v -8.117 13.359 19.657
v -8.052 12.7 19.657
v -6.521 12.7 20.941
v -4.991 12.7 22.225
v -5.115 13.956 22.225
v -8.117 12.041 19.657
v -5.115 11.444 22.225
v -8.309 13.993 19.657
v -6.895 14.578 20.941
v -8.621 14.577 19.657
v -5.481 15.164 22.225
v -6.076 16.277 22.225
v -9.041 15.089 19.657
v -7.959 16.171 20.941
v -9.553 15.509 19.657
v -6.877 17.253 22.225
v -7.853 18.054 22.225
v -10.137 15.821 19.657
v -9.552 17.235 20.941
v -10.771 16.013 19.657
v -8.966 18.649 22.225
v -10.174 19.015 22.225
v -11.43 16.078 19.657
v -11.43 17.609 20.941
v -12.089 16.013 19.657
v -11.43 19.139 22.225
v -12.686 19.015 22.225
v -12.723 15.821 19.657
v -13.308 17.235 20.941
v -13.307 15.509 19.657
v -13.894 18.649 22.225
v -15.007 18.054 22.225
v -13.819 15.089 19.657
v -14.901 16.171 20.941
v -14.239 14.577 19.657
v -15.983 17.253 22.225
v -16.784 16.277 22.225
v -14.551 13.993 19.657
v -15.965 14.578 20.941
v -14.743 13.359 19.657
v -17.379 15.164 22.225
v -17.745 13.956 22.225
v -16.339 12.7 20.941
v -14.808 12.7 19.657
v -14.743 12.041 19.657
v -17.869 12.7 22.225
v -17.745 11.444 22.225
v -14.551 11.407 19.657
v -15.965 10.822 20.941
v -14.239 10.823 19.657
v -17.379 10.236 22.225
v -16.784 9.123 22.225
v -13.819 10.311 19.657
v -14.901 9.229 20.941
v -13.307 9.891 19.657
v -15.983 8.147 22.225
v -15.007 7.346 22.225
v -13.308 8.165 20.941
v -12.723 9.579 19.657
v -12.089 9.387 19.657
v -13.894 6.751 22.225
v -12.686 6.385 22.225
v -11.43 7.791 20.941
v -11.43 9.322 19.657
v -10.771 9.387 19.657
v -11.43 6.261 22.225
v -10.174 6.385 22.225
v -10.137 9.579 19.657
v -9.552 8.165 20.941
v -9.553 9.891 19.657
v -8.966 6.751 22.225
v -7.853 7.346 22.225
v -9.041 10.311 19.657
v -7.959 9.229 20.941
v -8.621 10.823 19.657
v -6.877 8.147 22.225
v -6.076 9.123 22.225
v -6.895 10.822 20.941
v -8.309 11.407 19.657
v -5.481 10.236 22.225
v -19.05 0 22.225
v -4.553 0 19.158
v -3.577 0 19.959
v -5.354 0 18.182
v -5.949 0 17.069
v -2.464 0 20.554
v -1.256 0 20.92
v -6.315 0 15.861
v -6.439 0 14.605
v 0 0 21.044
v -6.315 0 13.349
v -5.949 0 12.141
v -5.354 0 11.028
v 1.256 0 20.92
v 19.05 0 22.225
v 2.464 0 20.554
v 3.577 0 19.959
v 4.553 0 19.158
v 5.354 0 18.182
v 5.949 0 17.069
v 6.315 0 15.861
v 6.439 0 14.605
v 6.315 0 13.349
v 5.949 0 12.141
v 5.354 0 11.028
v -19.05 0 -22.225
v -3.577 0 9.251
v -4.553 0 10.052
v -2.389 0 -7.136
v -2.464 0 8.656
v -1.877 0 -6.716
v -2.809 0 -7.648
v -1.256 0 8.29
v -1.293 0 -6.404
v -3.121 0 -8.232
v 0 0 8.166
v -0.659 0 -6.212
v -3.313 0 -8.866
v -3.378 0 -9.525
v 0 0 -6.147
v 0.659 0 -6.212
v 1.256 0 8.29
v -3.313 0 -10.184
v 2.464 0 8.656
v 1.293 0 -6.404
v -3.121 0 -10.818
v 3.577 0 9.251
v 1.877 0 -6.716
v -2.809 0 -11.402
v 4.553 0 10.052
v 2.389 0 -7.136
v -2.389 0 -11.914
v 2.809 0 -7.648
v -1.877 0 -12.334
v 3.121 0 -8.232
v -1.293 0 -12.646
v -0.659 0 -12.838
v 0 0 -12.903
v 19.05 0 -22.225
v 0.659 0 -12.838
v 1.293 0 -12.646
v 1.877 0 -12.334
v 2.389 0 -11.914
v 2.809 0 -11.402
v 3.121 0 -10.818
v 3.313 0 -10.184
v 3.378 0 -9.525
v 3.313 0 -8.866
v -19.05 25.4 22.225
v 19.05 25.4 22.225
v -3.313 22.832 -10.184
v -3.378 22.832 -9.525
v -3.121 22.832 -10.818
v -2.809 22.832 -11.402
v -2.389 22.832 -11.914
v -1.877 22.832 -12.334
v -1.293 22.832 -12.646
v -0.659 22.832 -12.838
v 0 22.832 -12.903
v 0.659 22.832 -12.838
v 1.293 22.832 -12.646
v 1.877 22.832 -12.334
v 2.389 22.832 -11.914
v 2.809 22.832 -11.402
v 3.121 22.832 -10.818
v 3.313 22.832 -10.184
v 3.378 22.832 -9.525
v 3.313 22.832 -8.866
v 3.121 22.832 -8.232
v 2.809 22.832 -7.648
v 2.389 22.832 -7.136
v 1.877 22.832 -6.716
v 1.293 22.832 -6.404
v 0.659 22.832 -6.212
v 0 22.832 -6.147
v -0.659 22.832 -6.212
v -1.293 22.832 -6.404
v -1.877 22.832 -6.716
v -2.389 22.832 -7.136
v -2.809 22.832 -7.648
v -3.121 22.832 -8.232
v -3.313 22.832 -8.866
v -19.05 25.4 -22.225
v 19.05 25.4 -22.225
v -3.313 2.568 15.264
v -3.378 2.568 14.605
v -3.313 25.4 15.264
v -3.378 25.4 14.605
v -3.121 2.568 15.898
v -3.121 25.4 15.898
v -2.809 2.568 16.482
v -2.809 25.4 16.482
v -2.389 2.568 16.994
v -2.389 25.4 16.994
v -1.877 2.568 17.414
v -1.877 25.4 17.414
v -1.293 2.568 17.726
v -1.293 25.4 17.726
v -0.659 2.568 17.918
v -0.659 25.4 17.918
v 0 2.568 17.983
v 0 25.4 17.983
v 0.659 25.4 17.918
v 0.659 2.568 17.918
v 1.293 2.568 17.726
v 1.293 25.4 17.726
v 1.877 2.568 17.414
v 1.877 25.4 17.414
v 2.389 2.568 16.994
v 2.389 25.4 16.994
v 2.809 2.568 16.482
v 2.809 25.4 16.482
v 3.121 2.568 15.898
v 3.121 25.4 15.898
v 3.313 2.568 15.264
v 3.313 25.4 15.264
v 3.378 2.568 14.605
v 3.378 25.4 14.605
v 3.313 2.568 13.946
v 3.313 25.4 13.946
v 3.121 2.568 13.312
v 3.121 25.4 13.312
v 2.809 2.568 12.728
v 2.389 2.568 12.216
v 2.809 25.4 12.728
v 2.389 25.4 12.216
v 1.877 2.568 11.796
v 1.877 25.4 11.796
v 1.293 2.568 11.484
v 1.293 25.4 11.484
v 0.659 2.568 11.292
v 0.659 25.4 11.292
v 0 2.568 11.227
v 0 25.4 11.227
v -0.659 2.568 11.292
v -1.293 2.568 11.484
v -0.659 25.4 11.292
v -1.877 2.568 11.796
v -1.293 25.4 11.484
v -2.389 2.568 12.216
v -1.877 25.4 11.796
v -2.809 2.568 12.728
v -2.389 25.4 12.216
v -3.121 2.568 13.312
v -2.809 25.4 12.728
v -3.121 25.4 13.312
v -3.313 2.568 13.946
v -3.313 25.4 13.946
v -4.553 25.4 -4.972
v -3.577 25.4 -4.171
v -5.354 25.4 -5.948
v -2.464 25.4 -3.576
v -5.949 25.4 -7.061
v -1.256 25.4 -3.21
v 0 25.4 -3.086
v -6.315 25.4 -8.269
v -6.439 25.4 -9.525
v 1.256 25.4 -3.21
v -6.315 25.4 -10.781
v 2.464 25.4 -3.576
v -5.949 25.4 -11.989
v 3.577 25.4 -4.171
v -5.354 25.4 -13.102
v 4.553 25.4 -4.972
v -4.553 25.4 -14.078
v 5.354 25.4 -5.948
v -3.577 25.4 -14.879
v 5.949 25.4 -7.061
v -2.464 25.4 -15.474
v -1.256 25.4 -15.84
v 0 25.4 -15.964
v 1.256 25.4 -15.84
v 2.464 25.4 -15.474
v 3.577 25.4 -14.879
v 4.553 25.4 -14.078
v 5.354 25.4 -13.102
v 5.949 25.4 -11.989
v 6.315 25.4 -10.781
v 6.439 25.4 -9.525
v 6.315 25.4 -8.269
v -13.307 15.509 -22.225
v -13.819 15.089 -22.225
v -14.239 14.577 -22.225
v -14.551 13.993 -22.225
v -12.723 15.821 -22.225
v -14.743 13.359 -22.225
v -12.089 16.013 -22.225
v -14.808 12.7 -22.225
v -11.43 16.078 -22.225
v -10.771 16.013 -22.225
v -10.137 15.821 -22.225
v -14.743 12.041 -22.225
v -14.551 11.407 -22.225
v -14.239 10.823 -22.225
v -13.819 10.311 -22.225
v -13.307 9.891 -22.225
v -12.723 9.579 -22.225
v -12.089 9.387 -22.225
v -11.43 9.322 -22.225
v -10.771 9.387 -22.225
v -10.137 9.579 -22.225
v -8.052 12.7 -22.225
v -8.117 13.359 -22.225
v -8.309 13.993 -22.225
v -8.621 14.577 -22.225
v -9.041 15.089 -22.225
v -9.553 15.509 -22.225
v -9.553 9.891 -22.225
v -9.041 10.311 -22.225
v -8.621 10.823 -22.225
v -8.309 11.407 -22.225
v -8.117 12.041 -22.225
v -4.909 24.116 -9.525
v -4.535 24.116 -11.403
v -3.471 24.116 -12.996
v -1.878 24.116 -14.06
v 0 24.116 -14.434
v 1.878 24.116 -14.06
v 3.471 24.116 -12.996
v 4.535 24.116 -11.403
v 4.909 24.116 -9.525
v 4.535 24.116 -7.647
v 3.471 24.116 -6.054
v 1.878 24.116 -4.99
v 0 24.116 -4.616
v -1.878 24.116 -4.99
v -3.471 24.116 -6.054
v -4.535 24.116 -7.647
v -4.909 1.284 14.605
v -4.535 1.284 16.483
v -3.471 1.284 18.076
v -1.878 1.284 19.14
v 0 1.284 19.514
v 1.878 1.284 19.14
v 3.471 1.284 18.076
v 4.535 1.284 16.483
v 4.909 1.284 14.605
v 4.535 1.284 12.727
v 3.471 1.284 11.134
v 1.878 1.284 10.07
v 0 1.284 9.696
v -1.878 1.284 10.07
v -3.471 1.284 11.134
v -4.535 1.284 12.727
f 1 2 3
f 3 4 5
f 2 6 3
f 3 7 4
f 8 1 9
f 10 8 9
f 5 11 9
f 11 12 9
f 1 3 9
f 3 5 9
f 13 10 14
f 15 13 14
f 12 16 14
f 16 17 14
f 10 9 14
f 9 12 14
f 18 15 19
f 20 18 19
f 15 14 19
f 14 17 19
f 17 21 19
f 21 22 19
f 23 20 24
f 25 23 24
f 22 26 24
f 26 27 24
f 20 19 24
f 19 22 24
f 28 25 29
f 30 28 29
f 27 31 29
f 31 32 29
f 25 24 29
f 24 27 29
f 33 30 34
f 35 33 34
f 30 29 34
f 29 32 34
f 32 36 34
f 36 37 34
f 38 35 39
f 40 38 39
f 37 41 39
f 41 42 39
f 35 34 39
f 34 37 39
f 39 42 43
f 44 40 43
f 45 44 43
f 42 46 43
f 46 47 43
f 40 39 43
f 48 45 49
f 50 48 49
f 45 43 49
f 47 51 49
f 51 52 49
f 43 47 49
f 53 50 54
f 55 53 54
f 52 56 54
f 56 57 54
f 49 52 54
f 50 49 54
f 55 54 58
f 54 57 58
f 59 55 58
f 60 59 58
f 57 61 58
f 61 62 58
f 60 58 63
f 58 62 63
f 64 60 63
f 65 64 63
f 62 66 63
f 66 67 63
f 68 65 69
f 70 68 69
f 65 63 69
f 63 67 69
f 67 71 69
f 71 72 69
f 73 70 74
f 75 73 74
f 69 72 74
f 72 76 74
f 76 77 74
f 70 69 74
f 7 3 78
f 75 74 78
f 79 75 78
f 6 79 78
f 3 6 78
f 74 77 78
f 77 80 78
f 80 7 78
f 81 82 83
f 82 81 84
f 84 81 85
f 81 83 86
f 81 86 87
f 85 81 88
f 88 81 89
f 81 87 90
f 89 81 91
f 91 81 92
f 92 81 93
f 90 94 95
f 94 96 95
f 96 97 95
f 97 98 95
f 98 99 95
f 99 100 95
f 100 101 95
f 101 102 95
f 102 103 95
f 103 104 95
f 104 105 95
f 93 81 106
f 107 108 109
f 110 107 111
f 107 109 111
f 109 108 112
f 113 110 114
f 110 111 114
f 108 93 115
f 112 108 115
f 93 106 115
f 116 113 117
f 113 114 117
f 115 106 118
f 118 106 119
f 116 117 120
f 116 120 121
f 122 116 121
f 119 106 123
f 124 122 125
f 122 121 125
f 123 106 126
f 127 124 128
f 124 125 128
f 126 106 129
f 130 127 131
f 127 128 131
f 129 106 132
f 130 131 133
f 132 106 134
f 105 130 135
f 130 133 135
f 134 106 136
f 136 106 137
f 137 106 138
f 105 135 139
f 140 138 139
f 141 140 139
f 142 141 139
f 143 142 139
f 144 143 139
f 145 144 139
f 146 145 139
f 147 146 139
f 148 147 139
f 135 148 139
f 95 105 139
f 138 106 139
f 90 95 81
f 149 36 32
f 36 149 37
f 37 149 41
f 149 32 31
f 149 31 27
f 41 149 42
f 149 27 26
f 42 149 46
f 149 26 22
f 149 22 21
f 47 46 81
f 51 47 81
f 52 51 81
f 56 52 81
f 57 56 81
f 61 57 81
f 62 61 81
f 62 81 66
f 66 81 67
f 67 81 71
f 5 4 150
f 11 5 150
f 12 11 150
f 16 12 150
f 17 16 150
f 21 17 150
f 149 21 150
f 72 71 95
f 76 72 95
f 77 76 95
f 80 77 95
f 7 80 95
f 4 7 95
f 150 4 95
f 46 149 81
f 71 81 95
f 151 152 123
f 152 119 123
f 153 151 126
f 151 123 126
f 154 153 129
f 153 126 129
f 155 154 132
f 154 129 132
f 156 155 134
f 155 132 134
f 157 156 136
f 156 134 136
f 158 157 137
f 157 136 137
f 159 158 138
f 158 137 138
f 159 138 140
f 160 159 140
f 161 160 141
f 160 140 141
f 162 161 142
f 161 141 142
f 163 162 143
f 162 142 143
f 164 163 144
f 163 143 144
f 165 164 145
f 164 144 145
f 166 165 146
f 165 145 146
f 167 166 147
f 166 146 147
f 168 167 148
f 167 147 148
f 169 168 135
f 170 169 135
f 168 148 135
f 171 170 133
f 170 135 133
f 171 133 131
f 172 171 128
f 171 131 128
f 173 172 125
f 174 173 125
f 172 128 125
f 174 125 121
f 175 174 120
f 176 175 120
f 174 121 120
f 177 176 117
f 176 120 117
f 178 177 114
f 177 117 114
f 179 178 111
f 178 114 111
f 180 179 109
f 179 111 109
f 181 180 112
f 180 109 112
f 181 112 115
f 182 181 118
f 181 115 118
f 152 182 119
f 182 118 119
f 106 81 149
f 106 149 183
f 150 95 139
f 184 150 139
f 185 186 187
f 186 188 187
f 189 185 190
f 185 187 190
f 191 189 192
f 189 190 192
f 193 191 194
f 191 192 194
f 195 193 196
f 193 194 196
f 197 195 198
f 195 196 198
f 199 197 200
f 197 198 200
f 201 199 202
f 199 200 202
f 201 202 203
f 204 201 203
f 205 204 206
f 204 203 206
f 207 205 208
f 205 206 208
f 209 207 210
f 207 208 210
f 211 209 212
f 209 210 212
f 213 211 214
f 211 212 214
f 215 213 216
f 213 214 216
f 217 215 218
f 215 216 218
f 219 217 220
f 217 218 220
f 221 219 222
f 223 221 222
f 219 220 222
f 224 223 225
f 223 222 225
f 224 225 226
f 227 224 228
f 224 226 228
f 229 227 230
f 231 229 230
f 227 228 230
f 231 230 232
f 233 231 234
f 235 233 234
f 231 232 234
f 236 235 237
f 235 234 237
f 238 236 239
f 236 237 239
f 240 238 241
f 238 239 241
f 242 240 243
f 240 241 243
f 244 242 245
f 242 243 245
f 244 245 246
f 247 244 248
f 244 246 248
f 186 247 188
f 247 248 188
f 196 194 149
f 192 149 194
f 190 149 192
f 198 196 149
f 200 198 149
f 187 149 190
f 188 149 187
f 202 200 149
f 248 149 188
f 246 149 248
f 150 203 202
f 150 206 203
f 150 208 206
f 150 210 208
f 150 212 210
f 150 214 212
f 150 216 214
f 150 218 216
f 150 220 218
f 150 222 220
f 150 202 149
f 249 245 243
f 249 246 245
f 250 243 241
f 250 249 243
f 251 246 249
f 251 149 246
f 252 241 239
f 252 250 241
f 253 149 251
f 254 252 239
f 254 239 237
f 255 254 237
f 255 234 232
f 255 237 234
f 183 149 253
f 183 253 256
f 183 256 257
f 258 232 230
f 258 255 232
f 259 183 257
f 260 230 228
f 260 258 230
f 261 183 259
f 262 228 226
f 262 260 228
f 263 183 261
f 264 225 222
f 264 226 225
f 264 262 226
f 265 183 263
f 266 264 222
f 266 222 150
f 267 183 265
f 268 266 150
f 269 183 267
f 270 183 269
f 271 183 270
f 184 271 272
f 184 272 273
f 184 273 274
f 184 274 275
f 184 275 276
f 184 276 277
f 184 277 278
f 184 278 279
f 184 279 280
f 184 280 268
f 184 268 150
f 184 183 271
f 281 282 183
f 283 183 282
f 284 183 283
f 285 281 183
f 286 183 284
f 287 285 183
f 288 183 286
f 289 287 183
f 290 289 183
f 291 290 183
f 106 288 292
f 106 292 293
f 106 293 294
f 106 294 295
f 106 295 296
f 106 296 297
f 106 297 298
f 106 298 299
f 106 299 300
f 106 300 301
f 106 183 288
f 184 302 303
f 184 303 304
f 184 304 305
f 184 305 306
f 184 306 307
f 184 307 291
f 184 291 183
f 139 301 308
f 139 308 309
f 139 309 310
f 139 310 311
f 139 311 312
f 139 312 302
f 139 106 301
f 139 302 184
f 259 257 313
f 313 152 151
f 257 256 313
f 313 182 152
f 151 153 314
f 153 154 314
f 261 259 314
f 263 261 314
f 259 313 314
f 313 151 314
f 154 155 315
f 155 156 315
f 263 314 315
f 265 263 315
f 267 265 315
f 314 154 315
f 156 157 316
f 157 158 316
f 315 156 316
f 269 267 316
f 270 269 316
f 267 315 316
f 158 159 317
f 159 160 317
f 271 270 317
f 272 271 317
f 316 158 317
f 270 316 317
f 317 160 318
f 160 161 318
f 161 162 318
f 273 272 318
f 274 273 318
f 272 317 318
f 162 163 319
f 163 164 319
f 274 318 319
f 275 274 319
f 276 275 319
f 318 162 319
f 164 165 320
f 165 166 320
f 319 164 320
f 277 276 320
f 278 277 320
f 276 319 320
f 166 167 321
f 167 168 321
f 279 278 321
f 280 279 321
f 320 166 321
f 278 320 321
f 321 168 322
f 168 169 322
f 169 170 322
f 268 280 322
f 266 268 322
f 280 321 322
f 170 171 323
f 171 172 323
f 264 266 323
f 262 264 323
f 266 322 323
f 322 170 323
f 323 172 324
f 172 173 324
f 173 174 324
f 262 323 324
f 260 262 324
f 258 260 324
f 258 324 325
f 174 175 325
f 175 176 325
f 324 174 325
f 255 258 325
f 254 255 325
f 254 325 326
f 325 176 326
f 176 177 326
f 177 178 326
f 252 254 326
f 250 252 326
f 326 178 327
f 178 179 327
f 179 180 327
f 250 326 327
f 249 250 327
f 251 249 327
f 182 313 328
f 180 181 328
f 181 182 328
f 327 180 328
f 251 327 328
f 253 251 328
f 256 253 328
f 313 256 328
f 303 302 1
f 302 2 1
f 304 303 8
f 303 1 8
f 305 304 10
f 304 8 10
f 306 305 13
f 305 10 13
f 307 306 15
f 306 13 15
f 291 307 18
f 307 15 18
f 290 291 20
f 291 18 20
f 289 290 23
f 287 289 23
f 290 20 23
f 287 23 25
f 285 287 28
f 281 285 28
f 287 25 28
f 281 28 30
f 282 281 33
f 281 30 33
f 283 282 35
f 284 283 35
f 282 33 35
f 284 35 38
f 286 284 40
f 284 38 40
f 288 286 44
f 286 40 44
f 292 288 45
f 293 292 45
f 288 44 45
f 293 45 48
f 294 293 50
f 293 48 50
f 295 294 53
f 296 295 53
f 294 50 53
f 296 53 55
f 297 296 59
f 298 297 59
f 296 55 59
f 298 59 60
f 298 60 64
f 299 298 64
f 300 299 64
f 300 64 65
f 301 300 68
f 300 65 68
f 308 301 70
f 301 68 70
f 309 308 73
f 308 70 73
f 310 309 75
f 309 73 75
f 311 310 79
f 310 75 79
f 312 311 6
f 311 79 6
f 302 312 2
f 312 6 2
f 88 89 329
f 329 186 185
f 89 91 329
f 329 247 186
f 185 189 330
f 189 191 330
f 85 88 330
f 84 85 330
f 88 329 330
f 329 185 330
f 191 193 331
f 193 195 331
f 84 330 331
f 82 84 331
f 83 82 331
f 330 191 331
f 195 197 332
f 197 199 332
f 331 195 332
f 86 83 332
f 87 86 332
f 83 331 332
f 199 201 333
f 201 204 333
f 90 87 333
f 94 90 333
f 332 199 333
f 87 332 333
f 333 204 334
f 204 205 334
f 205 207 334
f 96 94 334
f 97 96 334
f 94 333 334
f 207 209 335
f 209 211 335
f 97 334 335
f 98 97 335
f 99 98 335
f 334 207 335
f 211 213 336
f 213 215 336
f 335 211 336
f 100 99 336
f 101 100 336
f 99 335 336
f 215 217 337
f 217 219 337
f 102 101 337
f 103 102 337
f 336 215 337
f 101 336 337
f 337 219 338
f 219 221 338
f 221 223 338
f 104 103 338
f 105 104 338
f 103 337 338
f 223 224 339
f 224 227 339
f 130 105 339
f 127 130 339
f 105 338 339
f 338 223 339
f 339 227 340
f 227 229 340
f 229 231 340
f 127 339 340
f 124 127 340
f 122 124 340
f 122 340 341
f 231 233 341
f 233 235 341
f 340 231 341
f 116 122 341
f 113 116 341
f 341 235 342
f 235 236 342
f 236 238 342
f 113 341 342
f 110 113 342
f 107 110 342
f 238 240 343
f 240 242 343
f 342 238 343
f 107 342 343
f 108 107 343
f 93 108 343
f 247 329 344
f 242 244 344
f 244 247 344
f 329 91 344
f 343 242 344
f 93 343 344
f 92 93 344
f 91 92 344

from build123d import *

# Parameters (mm, degrees)
SKETCH1_W                                           = 38.1
SKETCH1_H                                           = 44.45
BOSS_EXTRUDE1_DEPTH                                 = 25.4
CSK_FOR_1_4_FLAT_HEAD_MACHINE_SCREW_100_D           = 6.7564
CSK_FOR_1_4_FLAT_HEAD_MACHINE_SCREW_100_CSINK_D     = 12.8778
CSK_FOR_1_4_FLAT_HEAD_MACHINE_SCREW_100_CSINK_ANGLE = 100
CSK_FOR_1_4_FLAT_HEAD_MACHINE_SCREW_2_D             = 6.7564
CSK_FOR_1_4_FLAT_HEAD_MACHINE_SCREW_2_CSINK_D       = 12.8778
CSK_FOR_1_4_FLAT_HEAD_MACHINE_SCREW_2_CSINK_ANGLE   = 100


# Read off the part's stored shape, not the designer's step: CSK for 1/4 Flat Head Machine Screw (100)3
with BuildPart() as part:
    # Sketch1 → Boss-Extrude1 (new body)
    with BuildSketch(Plane(origin=(0, 0, 0), x_dir=(1, 0, 0), z_dir=(0, 1, 0))):
        Rectangle(SKETCH1_W, SKETCH1_H)
    extrude(amount=BOSS_EXTRUDE1_DEPTH)

    # CSK for 1_4 Flat Head Machine Screw _100 (through all)
    with Locations(Plane(origin=(0, 25.4, 0), x_dir=(1, 0, 0), z_dir=(0, 1, 0))):
        with Locations((0, 9.525)):
            CounterSinkHole(CSK_FOR_1_4_FLAT_HEAD_MACHINE_SCREW_100_D / 2, CSK_FOR_1_4_FLAT_HEAD_MACHINE_SCREW_100_CSINK_D / 2, counter_sink_angle=CSK_FOR_1_4_FLAT_HEAD_MACHINE_SCREW_100_CSINK_ANGLE)

    # CSK for 1_4 Flat Head Machine Screw  2 (through all)
    with Locations(Plane.XZ):
        with Locations((0, 14.605)):
            CounterSinkHole(CSK_FOR_1_4_FLAT_HEAD_MACHINE_SCREW_2_D / 2, CSK_FOR_1_4_FLAT_HEAD_MACHINE_SCREW_2_CSINK_D / 2, counter_sink_angle=CSK_FOR_1_4_FLAT_HEAD_MACHINE_SCREW_2_CSINK_ANGLE)

    # CSK for 1_4 Flat Head Machine Screw 3 ou → CSK for 1_4 Flat Head Machine Screw  3 (revolve, cut)
    with BuildSketch(Plane(origin=(-11.43, 12.7, 0), x_dir=(1, 0, 0), z_dir=(0, -1, 0))):
        Polygon((0, -22.225), (3.3782, -22.225), (3.3782, 19.656767759), (6.4389, 22.225), (0, 22.225), align=None)
    revolve(axis=Axis((-11.43, 12.7, 0), (0, 0, 1)), mode=Mode.SUBTRACT)


solid = part.part
